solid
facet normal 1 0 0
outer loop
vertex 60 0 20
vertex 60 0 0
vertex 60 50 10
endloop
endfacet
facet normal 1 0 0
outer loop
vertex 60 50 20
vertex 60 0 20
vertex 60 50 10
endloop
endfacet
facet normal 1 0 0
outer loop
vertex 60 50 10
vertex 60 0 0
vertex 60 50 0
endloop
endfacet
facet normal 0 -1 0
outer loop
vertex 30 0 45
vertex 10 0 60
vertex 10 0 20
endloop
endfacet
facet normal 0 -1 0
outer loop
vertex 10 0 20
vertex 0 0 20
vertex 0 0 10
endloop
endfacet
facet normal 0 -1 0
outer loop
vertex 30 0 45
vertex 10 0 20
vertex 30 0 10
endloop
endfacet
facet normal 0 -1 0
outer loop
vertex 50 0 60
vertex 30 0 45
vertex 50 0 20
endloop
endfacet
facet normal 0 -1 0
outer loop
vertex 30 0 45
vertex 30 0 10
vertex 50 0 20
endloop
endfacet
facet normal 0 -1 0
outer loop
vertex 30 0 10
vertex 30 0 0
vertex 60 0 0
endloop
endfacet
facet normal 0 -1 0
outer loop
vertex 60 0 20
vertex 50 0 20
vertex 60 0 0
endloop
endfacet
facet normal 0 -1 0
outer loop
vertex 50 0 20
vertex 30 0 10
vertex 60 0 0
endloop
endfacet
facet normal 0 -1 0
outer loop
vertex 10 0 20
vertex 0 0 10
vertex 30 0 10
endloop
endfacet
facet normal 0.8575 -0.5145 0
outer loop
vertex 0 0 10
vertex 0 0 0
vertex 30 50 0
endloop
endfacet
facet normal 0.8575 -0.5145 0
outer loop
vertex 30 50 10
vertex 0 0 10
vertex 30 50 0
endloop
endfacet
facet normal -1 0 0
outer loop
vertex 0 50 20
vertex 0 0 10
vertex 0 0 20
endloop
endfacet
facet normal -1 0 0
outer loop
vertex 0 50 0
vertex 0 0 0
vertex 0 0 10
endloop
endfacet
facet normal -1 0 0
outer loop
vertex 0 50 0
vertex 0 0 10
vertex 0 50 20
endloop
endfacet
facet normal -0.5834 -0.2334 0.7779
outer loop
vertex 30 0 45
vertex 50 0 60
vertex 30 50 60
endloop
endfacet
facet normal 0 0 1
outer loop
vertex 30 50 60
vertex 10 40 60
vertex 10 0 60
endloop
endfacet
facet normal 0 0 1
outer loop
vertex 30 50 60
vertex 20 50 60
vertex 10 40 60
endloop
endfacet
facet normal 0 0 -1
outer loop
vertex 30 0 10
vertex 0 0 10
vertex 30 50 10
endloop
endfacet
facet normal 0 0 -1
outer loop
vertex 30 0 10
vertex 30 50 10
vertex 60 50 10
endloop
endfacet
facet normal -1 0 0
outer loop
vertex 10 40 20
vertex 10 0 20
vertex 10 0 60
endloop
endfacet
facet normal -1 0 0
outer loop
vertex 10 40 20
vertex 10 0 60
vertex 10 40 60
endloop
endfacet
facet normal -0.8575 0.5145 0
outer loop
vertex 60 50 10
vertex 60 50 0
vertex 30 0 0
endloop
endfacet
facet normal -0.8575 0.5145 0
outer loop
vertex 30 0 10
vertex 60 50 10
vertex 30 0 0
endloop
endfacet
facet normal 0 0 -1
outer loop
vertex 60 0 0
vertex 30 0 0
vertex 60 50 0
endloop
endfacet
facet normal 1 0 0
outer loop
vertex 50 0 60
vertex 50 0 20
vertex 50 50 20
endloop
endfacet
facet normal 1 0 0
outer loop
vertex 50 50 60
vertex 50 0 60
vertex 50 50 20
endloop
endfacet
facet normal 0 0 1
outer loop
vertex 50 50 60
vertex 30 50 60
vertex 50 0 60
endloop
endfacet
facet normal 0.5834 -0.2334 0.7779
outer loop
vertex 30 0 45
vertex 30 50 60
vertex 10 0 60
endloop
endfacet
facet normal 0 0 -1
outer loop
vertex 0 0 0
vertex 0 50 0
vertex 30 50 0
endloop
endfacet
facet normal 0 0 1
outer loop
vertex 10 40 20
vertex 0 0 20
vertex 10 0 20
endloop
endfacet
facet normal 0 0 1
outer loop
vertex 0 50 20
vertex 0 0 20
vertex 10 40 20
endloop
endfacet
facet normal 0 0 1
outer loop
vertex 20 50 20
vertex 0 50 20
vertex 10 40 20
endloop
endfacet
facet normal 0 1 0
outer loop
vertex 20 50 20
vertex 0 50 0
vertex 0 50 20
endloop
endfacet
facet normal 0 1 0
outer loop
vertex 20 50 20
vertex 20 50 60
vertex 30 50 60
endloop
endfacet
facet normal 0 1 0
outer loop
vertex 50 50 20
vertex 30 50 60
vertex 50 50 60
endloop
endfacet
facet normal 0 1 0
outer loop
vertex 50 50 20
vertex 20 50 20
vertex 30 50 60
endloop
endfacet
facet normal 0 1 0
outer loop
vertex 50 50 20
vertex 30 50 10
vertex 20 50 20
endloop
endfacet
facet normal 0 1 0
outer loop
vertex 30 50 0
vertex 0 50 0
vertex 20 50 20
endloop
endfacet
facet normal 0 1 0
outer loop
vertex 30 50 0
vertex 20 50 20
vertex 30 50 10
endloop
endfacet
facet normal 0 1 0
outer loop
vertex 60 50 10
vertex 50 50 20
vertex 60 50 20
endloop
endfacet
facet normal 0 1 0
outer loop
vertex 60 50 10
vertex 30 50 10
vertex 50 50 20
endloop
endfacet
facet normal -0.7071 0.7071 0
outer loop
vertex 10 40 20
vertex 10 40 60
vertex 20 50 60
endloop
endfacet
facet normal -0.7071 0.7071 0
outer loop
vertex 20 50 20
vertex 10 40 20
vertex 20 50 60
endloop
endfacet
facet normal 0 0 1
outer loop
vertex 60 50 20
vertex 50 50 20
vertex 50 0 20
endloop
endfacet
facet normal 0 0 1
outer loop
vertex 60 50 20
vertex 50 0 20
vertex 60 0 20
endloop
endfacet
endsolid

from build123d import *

# Parameters (mm, degrees)
F0_W     = 60
F0_H     = 50
F1_DEPTH = 20
F2_W     = 40
F2_H     = 50
F3_DEPTH = 40
F5_DEPTH = 10
F7_DEPTH = 40


with BuildPart() as f1:
    # F0 (on Top) → F1 (new body)
    with BuildSketch(Plane.XY):
        with Locations((30, 25)):
            Rectangle(F0_W, F0_H)
    extrude(amount=F1_DEPTH)

    # F2 (on face) → F3 (join)
    with BuildSketch(Plane.XY.offset(20)):
        with Locations((30, 25)):
            Rectangle(F2_W, F2_H)
    extrude(amount=F3_DEPTH)

    # F4 (on face) → F5 (cut)
    with BuildSketch(Plane(origin=(0, 0, 0), x_dir=(1, 0, 0), z_dir=(0, 0, -1))):
        Polygon((30, 0), (0, 0), (30, -50), (60, -50), align=None)
    extrude(amount=-F5_DEPTH, mode=Mode.SUBTRACT)

    # F6 (on face) → F7 (cut)
    with BuildSketch(Plane.XY.offset(60)):
        Polygon((20, 50), (10, 50), (10, 40), align=None)
    extrude(amount=-F7_DEPTH, mode=Mode.SUBTRACT)

    # F12: sweep along a path in F11
    with BuildLine(Plane(origin=(30, 0, 0), x_dir=(0, -1, 0), z_dir=(-1, 0, 0))) as f12_path:
        Line((0, 45), (-50, 60))
    # F8 (on face) → F12 (sweep, cut)
    with BuildSketch(Plane.XY.offset(60)):
        Polygon((30, 50), (10, 0), (30, 0), align=None)
        Polygon((30, 50), (30, 0), (50, 0), align=None)
    sweep(path=f12_path.line, mode=Mode.SUBTRACT)


solid = f1.part
